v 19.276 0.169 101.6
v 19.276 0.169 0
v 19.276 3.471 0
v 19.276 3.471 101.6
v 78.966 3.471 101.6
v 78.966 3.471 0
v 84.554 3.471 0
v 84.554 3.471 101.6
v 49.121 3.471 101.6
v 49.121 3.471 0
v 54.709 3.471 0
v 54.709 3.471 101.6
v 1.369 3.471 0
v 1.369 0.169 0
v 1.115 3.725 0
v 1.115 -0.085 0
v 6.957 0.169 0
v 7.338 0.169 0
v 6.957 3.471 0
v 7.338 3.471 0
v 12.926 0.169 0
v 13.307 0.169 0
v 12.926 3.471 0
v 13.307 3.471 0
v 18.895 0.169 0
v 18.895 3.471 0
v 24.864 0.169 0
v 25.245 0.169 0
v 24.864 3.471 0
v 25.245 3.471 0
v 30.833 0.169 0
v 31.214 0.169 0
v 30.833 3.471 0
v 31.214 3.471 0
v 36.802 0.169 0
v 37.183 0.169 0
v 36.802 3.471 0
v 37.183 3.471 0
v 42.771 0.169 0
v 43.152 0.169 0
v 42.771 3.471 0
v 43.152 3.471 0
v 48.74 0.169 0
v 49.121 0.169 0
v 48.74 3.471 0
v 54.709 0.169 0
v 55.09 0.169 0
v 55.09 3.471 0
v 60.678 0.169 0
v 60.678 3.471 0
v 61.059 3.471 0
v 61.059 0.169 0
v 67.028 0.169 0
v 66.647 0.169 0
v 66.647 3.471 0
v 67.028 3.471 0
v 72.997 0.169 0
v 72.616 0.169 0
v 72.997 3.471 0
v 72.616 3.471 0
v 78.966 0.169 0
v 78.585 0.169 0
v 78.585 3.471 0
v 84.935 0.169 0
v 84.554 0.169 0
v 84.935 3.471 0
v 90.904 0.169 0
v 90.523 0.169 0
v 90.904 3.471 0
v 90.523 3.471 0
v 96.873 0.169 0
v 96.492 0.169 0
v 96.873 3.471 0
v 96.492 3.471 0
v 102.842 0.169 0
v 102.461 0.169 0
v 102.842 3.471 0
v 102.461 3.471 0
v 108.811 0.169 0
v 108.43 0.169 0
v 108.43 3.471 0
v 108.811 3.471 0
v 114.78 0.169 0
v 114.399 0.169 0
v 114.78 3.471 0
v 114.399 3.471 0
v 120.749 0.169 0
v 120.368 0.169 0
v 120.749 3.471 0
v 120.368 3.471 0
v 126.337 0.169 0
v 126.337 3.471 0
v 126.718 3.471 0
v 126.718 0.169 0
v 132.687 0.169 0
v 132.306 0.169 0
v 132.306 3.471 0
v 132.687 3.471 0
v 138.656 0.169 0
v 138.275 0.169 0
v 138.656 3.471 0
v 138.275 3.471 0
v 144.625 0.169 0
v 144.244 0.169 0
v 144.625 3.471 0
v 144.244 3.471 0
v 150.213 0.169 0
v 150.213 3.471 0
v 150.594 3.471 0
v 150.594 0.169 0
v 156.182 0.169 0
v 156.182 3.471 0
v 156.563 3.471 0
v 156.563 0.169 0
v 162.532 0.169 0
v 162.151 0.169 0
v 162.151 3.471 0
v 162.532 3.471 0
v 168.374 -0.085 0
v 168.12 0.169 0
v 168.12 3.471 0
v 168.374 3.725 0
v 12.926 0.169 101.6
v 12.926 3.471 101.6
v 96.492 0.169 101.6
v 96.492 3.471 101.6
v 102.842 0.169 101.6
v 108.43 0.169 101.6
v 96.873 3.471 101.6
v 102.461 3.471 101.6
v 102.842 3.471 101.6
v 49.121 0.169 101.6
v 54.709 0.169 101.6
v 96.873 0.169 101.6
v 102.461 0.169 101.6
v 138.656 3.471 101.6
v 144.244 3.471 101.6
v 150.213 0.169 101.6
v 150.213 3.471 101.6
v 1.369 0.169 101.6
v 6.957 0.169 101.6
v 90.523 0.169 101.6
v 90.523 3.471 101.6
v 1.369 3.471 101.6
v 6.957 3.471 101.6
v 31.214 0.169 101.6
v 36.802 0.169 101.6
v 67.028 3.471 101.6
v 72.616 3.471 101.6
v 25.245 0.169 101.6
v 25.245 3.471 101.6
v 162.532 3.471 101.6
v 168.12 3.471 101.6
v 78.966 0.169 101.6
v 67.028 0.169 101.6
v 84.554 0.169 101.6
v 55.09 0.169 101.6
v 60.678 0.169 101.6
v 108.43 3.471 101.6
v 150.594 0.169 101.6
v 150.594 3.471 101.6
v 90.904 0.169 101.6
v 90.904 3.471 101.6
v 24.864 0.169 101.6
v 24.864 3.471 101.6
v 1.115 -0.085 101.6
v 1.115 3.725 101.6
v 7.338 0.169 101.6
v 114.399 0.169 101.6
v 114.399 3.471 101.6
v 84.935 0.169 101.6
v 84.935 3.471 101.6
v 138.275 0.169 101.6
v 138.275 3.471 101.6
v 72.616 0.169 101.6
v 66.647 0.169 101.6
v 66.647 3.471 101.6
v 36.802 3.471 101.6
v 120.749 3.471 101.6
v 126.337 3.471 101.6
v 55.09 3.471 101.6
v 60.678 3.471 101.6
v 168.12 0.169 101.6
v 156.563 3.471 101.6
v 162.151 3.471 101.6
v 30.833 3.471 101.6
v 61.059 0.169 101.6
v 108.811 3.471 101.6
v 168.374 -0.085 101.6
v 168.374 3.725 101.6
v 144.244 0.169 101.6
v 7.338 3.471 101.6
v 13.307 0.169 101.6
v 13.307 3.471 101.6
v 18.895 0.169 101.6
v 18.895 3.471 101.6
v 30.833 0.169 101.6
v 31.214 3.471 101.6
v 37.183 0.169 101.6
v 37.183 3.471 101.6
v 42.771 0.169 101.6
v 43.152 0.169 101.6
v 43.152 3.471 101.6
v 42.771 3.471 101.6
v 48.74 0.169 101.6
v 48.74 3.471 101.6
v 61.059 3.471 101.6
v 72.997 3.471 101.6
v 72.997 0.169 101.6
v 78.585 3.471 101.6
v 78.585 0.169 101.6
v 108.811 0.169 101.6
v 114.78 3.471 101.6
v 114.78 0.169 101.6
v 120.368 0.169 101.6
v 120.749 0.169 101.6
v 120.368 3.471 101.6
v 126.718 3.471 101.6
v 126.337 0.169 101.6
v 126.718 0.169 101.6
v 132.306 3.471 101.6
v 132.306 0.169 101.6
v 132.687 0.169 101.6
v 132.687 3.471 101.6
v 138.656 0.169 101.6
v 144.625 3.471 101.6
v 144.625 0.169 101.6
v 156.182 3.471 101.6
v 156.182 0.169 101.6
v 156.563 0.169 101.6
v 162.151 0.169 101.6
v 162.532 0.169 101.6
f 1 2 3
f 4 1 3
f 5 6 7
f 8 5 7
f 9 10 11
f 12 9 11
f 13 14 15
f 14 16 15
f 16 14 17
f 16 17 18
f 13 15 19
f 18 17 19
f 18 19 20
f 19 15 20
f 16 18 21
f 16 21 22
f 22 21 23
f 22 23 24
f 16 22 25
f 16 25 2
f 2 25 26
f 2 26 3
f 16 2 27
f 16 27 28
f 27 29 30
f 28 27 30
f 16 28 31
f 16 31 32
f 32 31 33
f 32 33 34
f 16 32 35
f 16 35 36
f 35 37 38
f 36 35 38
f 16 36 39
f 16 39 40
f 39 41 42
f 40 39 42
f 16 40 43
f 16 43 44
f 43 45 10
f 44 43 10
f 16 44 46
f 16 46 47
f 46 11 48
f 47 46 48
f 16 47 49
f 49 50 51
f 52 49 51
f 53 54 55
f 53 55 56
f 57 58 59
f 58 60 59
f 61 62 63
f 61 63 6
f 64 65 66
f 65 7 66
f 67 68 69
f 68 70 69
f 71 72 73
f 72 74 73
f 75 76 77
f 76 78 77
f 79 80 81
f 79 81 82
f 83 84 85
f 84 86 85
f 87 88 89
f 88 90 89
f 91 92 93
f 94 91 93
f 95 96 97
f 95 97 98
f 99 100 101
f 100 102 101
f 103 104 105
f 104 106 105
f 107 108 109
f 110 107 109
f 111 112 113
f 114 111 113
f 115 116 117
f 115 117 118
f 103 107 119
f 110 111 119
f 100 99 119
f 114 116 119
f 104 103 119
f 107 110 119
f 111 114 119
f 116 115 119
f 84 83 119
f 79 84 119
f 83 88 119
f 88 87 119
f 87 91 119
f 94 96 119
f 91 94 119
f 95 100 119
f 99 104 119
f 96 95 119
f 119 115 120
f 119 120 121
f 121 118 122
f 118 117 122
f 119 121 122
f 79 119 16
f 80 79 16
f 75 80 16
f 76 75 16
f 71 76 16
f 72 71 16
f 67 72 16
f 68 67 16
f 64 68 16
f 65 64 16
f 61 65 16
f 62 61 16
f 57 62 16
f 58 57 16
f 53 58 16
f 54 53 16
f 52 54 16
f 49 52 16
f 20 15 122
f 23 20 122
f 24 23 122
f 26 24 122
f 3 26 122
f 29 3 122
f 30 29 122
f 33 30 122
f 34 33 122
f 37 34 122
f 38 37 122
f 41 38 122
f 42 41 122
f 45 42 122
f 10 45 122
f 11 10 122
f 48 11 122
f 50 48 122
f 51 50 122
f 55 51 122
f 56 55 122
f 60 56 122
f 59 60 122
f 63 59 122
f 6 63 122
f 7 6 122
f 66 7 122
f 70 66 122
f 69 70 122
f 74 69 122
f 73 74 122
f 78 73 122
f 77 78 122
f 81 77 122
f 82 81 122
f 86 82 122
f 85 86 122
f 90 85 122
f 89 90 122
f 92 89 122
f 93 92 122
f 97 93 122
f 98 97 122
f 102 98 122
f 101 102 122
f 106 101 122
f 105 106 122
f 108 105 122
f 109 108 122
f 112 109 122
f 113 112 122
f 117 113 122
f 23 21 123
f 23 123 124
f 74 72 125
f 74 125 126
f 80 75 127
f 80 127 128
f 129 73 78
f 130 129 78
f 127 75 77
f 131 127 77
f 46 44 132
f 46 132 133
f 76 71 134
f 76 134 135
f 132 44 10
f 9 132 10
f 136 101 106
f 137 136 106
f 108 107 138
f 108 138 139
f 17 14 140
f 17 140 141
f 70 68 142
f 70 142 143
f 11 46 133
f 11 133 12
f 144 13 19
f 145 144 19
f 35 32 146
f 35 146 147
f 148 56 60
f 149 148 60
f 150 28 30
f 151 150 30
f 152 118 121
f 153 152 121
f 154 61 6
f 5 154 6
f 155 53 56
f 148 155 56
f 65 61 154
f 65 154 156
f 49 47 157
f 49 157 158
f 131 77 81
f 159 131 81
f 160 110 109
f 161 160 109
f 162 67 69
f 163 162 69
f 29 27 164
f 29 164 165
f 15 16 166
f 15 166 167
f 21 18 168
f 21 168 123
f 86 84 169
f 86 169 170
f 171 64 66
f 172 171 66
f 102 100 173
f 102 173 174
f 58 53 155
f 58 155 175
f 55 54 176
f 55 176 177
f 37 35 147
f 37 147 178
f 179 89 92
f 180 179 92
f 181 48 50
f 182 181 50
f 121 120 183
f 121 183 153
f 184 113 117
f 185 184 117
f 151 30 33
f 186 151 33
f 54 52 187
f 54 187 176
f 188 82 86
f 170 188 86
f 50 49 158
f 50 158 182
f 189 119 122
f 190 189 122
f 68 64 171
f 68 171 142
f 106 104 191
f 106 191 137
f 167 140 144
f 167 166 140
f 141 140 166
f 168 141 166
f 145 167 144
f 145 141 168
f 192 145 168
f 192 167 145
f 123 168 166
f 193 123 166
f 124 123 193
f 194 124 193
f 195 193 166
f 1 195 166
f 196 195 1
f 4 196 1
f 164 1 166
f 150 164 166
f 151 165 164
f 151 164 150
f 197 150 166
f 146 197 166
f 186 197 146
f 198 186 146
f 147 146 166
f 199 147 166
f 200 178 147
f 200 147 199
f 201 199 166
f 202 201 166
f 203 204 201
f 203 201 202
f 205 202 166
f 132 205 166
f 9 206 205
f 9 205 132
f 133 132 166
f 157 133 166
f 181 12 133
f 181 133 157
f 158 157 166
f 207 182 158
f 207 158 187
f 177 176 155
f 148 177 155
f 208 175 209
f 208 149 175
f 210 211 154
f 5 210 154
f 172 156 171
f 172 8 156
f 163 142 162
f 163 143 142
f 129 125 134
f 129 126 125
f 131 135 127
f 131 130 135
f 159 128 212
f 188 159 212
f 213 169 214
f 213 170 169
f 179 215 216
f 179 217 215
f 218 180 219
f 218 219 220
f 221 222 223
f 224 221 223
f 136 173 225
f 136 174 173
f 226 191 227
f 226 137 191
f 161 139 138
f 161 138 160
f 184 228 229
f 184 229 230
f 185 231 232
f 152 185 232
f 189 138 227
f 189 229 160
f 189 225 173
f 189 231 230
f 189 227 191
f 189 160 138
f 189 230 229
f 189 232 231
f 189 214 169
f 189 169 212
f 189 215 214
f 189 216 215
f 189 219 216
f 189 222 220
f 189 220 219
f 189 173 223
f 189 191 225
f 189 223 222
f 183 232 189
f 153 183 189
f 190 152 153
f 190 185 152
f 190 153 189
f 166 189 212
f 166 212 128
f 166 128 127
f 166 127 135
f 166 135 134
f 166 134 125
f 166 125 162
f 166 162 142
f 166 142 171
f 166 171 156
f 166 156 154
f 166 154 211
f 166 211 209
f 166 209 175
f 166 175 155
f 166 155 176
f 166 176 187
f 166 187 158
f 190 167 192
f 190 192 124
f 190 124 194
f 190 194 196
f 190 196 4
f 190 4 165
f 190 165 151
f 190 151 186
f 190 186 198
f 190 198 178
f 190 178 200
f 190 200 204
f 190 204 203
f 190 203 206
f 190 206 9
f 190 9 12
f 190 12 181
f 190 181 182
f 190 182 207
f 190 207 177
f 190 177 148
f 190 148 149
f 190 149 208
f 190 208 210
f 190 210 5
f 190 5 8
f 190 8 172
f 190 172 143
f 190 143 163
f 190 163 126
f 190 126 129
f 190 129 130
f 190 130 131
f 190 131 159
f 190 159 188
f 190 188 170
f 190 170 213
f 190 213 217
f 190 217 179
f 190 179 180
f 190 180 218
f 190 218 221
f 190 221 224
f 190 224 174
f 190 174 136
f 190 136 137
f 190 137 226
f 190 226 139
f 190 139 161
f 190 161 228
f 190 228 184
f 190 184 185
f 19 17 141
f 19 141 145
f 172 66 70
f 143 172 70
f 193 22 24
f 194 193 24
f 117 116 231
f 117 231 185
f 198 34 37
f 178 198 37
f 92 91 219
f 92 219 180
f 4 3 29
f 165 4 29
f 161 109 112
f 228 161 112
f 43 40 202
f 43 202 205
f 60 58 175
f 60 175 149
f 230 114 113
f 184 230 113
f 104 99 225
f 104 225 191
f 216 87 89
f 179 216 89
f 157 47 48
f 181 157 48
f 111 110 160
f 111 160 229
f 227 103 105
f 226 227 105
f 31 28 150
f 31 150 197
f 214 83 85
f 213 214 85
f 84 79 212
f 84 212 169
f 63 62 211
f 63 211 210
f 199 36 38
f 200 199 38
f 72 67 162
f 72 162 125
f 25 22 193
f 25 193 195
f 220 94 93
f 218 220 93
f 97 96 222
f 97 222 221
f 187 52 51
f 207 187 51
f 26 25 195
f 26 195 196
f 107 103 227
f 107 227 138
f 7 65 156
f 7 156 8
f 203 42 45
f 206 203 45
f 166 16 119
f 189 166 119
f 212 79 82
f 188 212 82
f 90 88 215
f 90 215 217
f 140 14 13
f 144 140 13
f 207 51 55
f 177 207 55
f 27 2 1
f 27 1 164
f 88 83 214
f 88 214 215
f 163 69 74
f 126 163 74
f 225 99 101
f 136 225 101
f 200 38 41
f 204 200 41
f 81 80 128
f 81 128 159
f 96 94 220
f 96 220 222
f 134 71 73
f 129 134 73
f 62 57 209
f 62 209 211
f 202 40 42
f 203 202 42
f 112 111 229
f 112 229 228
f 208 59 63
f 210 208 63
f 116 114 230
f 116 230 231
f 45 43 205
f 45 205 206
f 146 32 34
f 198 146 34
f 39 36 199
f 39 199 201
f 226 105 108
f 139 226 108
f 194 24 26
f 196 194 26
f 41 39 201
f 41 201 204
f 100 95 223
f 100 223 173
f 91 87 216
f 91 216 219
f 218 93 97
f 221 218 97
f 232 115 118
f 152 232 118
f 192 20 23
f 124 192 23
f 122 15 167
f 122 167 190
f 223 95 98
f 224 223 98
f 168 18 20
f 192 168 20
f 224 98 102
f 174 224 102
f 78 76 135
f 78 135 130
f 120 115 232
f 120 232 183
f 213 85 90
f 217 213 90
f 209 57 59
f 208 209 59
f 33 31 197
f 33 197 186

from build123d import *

# Parameters (mm, degrees)
F0_W     = 167.259
F0_H     = 3.81
F0_W_2   = 5.588
F0_H_2   = 3.302
F1_DEPTH = 101.6


with BuildPart() as f1:
    # F0 (on Top) → F1 (new body)
    with BuildSketch(Plane.XY):
        with Locations((84.74498, 1.819537)):
            Rectangle(F0_W, F0_H)
        with Locations((4.16348, 1.819537)):
            Rectangle(F0_W_2, F0_H_2, mode=Mode.SUBTRACT)
        with Locations((10.13248, 1.819537)):
            Rectangle(F0_W_2, F0_H_2, mode=Mode.SUBTRACT)
        with Locations((16.10148, 1.819537)):
            Rectangle(F0_W_2, F0_H_2, mode=Mode.SUBTRACT)
        with Locations((22.07048, 1.819537)):
            Rectangle(F0_W_2, F0_H_2, mode=Mode.SUBTRACT)
        with Locations((28.03948, 1.819537)):
            Rectangle(F0_W_2, F0_H_2, mode=Mode.SUBTRACT)
        with Locations((34.00848, 1.819537)):
            Rectangle(F0_W_2, F0_H_2, mode=Mode.SUBTRACT)
        with Locations((39.97748, 1.819537)):
            Rectangle(F0_W_2, F0_H_2, mode=Mode.SUBTRACT)
        with Locations((45.94648, 1.819537)):
            Rectangle(F0_W_2, F0_H_2, mode=Mode.SUBTRACT)
        with Locations((51.91548, 1.819537)):
            Rectangle(F0_W_2, F0_H_2, mode=Mode.SUBTRACT)
        with Locations((57.88448, 1.819537)):
            Rectangle(F0_W_2, F0_H_2, mode=Mode.SUBTRACT)
        with Locations((63.85348, 1.819537)):
            Rectangle(F0_W_2, F0_H_2, mode=Mode.SUBTRACT)
        with Locations((69.82248, 1.819537)):
            Rectangle(F0_W_2, F0_H_2, mode=Mode.SUBTRACT)
        with Locations((75.79148, 1.819537)):
            Rectangle(F0_W_2, F0_H_2, mode=Mode.SUBTRACT)
        with Locations((81.76048, 1.819537)):
            Rectangle(F0_W_2, F0_H_2, mode=Mode.SUBTRACT)
        with Locations((87.72948, 1.819537)):
            Rectangle(F0_W_2, F0_H_2, mode=Mode.SUBTRACT)
        with Locations((93.69848, 1.819537)):
            Rectangle(F0_W_2, F0_H_2, mode=Mode.SUBTRACT)
        with Locations((99.66748, 1.819537)):
            Rectangle(F0_W_2, F0_H_2, mode=Mode.SUBTRACT)
        with Locations((105.63648, 1.819537)):
            Rectangle(F0_W_2, F0_H_2, mode=Mode.SUBTRACT)
        with Locations((111.60548, 1.819537)):
            Rectangle(F0_W_2, F0_H_2, mode=Mode.SUBTRACT)
        with Locations((117.57448, 1.819537)):
            Rectangle(F0_W_2, F0_H_2, mode=Mode.SUBTRACT)
        with Locations((123.54348, 1.819537)):
            Rectangle(F0_W_2, F0_H_2, mode=Mode.SUBTRACT)
        with Locations((129.51248, 1.819537)):
            Rectangle(F0_W_2, F0_H_2, mode=Mode.SUBTRACT)
        with Locations((135.48148, 1.819537)):
            Rectangle(F0_W_2, F0_H_2, mode=Mode.SUBTRACT)
        with Locations((141.45048, 1.819537)):
            Rectangle(F0_W_2, F0_H_2, mode=Mode.SUBTRACT)
        with Locations((147.41948, 1.819537)):
            Rectangle(F0_W_2, F0_H_2, mode=Mode.SUBTRACT)
        with Locations((153.38848, 1.819537)):
            Rectangle(F0_W_2, F0_H_2, mode=Mode.SUBTRACT)
        with Locations((159.35748, 1.819537)):
            Rectangle(F0_W_2, F0_H_2, mode=Mode.SUBTRACT)
        with Locations((165.32648, 1.819537)):
            Rectangle(F0_W_2, F0_H_2, mode=Mode.SUBTRACT)
    extrude(amount=F1_DEPTH)


solid = f1.part
